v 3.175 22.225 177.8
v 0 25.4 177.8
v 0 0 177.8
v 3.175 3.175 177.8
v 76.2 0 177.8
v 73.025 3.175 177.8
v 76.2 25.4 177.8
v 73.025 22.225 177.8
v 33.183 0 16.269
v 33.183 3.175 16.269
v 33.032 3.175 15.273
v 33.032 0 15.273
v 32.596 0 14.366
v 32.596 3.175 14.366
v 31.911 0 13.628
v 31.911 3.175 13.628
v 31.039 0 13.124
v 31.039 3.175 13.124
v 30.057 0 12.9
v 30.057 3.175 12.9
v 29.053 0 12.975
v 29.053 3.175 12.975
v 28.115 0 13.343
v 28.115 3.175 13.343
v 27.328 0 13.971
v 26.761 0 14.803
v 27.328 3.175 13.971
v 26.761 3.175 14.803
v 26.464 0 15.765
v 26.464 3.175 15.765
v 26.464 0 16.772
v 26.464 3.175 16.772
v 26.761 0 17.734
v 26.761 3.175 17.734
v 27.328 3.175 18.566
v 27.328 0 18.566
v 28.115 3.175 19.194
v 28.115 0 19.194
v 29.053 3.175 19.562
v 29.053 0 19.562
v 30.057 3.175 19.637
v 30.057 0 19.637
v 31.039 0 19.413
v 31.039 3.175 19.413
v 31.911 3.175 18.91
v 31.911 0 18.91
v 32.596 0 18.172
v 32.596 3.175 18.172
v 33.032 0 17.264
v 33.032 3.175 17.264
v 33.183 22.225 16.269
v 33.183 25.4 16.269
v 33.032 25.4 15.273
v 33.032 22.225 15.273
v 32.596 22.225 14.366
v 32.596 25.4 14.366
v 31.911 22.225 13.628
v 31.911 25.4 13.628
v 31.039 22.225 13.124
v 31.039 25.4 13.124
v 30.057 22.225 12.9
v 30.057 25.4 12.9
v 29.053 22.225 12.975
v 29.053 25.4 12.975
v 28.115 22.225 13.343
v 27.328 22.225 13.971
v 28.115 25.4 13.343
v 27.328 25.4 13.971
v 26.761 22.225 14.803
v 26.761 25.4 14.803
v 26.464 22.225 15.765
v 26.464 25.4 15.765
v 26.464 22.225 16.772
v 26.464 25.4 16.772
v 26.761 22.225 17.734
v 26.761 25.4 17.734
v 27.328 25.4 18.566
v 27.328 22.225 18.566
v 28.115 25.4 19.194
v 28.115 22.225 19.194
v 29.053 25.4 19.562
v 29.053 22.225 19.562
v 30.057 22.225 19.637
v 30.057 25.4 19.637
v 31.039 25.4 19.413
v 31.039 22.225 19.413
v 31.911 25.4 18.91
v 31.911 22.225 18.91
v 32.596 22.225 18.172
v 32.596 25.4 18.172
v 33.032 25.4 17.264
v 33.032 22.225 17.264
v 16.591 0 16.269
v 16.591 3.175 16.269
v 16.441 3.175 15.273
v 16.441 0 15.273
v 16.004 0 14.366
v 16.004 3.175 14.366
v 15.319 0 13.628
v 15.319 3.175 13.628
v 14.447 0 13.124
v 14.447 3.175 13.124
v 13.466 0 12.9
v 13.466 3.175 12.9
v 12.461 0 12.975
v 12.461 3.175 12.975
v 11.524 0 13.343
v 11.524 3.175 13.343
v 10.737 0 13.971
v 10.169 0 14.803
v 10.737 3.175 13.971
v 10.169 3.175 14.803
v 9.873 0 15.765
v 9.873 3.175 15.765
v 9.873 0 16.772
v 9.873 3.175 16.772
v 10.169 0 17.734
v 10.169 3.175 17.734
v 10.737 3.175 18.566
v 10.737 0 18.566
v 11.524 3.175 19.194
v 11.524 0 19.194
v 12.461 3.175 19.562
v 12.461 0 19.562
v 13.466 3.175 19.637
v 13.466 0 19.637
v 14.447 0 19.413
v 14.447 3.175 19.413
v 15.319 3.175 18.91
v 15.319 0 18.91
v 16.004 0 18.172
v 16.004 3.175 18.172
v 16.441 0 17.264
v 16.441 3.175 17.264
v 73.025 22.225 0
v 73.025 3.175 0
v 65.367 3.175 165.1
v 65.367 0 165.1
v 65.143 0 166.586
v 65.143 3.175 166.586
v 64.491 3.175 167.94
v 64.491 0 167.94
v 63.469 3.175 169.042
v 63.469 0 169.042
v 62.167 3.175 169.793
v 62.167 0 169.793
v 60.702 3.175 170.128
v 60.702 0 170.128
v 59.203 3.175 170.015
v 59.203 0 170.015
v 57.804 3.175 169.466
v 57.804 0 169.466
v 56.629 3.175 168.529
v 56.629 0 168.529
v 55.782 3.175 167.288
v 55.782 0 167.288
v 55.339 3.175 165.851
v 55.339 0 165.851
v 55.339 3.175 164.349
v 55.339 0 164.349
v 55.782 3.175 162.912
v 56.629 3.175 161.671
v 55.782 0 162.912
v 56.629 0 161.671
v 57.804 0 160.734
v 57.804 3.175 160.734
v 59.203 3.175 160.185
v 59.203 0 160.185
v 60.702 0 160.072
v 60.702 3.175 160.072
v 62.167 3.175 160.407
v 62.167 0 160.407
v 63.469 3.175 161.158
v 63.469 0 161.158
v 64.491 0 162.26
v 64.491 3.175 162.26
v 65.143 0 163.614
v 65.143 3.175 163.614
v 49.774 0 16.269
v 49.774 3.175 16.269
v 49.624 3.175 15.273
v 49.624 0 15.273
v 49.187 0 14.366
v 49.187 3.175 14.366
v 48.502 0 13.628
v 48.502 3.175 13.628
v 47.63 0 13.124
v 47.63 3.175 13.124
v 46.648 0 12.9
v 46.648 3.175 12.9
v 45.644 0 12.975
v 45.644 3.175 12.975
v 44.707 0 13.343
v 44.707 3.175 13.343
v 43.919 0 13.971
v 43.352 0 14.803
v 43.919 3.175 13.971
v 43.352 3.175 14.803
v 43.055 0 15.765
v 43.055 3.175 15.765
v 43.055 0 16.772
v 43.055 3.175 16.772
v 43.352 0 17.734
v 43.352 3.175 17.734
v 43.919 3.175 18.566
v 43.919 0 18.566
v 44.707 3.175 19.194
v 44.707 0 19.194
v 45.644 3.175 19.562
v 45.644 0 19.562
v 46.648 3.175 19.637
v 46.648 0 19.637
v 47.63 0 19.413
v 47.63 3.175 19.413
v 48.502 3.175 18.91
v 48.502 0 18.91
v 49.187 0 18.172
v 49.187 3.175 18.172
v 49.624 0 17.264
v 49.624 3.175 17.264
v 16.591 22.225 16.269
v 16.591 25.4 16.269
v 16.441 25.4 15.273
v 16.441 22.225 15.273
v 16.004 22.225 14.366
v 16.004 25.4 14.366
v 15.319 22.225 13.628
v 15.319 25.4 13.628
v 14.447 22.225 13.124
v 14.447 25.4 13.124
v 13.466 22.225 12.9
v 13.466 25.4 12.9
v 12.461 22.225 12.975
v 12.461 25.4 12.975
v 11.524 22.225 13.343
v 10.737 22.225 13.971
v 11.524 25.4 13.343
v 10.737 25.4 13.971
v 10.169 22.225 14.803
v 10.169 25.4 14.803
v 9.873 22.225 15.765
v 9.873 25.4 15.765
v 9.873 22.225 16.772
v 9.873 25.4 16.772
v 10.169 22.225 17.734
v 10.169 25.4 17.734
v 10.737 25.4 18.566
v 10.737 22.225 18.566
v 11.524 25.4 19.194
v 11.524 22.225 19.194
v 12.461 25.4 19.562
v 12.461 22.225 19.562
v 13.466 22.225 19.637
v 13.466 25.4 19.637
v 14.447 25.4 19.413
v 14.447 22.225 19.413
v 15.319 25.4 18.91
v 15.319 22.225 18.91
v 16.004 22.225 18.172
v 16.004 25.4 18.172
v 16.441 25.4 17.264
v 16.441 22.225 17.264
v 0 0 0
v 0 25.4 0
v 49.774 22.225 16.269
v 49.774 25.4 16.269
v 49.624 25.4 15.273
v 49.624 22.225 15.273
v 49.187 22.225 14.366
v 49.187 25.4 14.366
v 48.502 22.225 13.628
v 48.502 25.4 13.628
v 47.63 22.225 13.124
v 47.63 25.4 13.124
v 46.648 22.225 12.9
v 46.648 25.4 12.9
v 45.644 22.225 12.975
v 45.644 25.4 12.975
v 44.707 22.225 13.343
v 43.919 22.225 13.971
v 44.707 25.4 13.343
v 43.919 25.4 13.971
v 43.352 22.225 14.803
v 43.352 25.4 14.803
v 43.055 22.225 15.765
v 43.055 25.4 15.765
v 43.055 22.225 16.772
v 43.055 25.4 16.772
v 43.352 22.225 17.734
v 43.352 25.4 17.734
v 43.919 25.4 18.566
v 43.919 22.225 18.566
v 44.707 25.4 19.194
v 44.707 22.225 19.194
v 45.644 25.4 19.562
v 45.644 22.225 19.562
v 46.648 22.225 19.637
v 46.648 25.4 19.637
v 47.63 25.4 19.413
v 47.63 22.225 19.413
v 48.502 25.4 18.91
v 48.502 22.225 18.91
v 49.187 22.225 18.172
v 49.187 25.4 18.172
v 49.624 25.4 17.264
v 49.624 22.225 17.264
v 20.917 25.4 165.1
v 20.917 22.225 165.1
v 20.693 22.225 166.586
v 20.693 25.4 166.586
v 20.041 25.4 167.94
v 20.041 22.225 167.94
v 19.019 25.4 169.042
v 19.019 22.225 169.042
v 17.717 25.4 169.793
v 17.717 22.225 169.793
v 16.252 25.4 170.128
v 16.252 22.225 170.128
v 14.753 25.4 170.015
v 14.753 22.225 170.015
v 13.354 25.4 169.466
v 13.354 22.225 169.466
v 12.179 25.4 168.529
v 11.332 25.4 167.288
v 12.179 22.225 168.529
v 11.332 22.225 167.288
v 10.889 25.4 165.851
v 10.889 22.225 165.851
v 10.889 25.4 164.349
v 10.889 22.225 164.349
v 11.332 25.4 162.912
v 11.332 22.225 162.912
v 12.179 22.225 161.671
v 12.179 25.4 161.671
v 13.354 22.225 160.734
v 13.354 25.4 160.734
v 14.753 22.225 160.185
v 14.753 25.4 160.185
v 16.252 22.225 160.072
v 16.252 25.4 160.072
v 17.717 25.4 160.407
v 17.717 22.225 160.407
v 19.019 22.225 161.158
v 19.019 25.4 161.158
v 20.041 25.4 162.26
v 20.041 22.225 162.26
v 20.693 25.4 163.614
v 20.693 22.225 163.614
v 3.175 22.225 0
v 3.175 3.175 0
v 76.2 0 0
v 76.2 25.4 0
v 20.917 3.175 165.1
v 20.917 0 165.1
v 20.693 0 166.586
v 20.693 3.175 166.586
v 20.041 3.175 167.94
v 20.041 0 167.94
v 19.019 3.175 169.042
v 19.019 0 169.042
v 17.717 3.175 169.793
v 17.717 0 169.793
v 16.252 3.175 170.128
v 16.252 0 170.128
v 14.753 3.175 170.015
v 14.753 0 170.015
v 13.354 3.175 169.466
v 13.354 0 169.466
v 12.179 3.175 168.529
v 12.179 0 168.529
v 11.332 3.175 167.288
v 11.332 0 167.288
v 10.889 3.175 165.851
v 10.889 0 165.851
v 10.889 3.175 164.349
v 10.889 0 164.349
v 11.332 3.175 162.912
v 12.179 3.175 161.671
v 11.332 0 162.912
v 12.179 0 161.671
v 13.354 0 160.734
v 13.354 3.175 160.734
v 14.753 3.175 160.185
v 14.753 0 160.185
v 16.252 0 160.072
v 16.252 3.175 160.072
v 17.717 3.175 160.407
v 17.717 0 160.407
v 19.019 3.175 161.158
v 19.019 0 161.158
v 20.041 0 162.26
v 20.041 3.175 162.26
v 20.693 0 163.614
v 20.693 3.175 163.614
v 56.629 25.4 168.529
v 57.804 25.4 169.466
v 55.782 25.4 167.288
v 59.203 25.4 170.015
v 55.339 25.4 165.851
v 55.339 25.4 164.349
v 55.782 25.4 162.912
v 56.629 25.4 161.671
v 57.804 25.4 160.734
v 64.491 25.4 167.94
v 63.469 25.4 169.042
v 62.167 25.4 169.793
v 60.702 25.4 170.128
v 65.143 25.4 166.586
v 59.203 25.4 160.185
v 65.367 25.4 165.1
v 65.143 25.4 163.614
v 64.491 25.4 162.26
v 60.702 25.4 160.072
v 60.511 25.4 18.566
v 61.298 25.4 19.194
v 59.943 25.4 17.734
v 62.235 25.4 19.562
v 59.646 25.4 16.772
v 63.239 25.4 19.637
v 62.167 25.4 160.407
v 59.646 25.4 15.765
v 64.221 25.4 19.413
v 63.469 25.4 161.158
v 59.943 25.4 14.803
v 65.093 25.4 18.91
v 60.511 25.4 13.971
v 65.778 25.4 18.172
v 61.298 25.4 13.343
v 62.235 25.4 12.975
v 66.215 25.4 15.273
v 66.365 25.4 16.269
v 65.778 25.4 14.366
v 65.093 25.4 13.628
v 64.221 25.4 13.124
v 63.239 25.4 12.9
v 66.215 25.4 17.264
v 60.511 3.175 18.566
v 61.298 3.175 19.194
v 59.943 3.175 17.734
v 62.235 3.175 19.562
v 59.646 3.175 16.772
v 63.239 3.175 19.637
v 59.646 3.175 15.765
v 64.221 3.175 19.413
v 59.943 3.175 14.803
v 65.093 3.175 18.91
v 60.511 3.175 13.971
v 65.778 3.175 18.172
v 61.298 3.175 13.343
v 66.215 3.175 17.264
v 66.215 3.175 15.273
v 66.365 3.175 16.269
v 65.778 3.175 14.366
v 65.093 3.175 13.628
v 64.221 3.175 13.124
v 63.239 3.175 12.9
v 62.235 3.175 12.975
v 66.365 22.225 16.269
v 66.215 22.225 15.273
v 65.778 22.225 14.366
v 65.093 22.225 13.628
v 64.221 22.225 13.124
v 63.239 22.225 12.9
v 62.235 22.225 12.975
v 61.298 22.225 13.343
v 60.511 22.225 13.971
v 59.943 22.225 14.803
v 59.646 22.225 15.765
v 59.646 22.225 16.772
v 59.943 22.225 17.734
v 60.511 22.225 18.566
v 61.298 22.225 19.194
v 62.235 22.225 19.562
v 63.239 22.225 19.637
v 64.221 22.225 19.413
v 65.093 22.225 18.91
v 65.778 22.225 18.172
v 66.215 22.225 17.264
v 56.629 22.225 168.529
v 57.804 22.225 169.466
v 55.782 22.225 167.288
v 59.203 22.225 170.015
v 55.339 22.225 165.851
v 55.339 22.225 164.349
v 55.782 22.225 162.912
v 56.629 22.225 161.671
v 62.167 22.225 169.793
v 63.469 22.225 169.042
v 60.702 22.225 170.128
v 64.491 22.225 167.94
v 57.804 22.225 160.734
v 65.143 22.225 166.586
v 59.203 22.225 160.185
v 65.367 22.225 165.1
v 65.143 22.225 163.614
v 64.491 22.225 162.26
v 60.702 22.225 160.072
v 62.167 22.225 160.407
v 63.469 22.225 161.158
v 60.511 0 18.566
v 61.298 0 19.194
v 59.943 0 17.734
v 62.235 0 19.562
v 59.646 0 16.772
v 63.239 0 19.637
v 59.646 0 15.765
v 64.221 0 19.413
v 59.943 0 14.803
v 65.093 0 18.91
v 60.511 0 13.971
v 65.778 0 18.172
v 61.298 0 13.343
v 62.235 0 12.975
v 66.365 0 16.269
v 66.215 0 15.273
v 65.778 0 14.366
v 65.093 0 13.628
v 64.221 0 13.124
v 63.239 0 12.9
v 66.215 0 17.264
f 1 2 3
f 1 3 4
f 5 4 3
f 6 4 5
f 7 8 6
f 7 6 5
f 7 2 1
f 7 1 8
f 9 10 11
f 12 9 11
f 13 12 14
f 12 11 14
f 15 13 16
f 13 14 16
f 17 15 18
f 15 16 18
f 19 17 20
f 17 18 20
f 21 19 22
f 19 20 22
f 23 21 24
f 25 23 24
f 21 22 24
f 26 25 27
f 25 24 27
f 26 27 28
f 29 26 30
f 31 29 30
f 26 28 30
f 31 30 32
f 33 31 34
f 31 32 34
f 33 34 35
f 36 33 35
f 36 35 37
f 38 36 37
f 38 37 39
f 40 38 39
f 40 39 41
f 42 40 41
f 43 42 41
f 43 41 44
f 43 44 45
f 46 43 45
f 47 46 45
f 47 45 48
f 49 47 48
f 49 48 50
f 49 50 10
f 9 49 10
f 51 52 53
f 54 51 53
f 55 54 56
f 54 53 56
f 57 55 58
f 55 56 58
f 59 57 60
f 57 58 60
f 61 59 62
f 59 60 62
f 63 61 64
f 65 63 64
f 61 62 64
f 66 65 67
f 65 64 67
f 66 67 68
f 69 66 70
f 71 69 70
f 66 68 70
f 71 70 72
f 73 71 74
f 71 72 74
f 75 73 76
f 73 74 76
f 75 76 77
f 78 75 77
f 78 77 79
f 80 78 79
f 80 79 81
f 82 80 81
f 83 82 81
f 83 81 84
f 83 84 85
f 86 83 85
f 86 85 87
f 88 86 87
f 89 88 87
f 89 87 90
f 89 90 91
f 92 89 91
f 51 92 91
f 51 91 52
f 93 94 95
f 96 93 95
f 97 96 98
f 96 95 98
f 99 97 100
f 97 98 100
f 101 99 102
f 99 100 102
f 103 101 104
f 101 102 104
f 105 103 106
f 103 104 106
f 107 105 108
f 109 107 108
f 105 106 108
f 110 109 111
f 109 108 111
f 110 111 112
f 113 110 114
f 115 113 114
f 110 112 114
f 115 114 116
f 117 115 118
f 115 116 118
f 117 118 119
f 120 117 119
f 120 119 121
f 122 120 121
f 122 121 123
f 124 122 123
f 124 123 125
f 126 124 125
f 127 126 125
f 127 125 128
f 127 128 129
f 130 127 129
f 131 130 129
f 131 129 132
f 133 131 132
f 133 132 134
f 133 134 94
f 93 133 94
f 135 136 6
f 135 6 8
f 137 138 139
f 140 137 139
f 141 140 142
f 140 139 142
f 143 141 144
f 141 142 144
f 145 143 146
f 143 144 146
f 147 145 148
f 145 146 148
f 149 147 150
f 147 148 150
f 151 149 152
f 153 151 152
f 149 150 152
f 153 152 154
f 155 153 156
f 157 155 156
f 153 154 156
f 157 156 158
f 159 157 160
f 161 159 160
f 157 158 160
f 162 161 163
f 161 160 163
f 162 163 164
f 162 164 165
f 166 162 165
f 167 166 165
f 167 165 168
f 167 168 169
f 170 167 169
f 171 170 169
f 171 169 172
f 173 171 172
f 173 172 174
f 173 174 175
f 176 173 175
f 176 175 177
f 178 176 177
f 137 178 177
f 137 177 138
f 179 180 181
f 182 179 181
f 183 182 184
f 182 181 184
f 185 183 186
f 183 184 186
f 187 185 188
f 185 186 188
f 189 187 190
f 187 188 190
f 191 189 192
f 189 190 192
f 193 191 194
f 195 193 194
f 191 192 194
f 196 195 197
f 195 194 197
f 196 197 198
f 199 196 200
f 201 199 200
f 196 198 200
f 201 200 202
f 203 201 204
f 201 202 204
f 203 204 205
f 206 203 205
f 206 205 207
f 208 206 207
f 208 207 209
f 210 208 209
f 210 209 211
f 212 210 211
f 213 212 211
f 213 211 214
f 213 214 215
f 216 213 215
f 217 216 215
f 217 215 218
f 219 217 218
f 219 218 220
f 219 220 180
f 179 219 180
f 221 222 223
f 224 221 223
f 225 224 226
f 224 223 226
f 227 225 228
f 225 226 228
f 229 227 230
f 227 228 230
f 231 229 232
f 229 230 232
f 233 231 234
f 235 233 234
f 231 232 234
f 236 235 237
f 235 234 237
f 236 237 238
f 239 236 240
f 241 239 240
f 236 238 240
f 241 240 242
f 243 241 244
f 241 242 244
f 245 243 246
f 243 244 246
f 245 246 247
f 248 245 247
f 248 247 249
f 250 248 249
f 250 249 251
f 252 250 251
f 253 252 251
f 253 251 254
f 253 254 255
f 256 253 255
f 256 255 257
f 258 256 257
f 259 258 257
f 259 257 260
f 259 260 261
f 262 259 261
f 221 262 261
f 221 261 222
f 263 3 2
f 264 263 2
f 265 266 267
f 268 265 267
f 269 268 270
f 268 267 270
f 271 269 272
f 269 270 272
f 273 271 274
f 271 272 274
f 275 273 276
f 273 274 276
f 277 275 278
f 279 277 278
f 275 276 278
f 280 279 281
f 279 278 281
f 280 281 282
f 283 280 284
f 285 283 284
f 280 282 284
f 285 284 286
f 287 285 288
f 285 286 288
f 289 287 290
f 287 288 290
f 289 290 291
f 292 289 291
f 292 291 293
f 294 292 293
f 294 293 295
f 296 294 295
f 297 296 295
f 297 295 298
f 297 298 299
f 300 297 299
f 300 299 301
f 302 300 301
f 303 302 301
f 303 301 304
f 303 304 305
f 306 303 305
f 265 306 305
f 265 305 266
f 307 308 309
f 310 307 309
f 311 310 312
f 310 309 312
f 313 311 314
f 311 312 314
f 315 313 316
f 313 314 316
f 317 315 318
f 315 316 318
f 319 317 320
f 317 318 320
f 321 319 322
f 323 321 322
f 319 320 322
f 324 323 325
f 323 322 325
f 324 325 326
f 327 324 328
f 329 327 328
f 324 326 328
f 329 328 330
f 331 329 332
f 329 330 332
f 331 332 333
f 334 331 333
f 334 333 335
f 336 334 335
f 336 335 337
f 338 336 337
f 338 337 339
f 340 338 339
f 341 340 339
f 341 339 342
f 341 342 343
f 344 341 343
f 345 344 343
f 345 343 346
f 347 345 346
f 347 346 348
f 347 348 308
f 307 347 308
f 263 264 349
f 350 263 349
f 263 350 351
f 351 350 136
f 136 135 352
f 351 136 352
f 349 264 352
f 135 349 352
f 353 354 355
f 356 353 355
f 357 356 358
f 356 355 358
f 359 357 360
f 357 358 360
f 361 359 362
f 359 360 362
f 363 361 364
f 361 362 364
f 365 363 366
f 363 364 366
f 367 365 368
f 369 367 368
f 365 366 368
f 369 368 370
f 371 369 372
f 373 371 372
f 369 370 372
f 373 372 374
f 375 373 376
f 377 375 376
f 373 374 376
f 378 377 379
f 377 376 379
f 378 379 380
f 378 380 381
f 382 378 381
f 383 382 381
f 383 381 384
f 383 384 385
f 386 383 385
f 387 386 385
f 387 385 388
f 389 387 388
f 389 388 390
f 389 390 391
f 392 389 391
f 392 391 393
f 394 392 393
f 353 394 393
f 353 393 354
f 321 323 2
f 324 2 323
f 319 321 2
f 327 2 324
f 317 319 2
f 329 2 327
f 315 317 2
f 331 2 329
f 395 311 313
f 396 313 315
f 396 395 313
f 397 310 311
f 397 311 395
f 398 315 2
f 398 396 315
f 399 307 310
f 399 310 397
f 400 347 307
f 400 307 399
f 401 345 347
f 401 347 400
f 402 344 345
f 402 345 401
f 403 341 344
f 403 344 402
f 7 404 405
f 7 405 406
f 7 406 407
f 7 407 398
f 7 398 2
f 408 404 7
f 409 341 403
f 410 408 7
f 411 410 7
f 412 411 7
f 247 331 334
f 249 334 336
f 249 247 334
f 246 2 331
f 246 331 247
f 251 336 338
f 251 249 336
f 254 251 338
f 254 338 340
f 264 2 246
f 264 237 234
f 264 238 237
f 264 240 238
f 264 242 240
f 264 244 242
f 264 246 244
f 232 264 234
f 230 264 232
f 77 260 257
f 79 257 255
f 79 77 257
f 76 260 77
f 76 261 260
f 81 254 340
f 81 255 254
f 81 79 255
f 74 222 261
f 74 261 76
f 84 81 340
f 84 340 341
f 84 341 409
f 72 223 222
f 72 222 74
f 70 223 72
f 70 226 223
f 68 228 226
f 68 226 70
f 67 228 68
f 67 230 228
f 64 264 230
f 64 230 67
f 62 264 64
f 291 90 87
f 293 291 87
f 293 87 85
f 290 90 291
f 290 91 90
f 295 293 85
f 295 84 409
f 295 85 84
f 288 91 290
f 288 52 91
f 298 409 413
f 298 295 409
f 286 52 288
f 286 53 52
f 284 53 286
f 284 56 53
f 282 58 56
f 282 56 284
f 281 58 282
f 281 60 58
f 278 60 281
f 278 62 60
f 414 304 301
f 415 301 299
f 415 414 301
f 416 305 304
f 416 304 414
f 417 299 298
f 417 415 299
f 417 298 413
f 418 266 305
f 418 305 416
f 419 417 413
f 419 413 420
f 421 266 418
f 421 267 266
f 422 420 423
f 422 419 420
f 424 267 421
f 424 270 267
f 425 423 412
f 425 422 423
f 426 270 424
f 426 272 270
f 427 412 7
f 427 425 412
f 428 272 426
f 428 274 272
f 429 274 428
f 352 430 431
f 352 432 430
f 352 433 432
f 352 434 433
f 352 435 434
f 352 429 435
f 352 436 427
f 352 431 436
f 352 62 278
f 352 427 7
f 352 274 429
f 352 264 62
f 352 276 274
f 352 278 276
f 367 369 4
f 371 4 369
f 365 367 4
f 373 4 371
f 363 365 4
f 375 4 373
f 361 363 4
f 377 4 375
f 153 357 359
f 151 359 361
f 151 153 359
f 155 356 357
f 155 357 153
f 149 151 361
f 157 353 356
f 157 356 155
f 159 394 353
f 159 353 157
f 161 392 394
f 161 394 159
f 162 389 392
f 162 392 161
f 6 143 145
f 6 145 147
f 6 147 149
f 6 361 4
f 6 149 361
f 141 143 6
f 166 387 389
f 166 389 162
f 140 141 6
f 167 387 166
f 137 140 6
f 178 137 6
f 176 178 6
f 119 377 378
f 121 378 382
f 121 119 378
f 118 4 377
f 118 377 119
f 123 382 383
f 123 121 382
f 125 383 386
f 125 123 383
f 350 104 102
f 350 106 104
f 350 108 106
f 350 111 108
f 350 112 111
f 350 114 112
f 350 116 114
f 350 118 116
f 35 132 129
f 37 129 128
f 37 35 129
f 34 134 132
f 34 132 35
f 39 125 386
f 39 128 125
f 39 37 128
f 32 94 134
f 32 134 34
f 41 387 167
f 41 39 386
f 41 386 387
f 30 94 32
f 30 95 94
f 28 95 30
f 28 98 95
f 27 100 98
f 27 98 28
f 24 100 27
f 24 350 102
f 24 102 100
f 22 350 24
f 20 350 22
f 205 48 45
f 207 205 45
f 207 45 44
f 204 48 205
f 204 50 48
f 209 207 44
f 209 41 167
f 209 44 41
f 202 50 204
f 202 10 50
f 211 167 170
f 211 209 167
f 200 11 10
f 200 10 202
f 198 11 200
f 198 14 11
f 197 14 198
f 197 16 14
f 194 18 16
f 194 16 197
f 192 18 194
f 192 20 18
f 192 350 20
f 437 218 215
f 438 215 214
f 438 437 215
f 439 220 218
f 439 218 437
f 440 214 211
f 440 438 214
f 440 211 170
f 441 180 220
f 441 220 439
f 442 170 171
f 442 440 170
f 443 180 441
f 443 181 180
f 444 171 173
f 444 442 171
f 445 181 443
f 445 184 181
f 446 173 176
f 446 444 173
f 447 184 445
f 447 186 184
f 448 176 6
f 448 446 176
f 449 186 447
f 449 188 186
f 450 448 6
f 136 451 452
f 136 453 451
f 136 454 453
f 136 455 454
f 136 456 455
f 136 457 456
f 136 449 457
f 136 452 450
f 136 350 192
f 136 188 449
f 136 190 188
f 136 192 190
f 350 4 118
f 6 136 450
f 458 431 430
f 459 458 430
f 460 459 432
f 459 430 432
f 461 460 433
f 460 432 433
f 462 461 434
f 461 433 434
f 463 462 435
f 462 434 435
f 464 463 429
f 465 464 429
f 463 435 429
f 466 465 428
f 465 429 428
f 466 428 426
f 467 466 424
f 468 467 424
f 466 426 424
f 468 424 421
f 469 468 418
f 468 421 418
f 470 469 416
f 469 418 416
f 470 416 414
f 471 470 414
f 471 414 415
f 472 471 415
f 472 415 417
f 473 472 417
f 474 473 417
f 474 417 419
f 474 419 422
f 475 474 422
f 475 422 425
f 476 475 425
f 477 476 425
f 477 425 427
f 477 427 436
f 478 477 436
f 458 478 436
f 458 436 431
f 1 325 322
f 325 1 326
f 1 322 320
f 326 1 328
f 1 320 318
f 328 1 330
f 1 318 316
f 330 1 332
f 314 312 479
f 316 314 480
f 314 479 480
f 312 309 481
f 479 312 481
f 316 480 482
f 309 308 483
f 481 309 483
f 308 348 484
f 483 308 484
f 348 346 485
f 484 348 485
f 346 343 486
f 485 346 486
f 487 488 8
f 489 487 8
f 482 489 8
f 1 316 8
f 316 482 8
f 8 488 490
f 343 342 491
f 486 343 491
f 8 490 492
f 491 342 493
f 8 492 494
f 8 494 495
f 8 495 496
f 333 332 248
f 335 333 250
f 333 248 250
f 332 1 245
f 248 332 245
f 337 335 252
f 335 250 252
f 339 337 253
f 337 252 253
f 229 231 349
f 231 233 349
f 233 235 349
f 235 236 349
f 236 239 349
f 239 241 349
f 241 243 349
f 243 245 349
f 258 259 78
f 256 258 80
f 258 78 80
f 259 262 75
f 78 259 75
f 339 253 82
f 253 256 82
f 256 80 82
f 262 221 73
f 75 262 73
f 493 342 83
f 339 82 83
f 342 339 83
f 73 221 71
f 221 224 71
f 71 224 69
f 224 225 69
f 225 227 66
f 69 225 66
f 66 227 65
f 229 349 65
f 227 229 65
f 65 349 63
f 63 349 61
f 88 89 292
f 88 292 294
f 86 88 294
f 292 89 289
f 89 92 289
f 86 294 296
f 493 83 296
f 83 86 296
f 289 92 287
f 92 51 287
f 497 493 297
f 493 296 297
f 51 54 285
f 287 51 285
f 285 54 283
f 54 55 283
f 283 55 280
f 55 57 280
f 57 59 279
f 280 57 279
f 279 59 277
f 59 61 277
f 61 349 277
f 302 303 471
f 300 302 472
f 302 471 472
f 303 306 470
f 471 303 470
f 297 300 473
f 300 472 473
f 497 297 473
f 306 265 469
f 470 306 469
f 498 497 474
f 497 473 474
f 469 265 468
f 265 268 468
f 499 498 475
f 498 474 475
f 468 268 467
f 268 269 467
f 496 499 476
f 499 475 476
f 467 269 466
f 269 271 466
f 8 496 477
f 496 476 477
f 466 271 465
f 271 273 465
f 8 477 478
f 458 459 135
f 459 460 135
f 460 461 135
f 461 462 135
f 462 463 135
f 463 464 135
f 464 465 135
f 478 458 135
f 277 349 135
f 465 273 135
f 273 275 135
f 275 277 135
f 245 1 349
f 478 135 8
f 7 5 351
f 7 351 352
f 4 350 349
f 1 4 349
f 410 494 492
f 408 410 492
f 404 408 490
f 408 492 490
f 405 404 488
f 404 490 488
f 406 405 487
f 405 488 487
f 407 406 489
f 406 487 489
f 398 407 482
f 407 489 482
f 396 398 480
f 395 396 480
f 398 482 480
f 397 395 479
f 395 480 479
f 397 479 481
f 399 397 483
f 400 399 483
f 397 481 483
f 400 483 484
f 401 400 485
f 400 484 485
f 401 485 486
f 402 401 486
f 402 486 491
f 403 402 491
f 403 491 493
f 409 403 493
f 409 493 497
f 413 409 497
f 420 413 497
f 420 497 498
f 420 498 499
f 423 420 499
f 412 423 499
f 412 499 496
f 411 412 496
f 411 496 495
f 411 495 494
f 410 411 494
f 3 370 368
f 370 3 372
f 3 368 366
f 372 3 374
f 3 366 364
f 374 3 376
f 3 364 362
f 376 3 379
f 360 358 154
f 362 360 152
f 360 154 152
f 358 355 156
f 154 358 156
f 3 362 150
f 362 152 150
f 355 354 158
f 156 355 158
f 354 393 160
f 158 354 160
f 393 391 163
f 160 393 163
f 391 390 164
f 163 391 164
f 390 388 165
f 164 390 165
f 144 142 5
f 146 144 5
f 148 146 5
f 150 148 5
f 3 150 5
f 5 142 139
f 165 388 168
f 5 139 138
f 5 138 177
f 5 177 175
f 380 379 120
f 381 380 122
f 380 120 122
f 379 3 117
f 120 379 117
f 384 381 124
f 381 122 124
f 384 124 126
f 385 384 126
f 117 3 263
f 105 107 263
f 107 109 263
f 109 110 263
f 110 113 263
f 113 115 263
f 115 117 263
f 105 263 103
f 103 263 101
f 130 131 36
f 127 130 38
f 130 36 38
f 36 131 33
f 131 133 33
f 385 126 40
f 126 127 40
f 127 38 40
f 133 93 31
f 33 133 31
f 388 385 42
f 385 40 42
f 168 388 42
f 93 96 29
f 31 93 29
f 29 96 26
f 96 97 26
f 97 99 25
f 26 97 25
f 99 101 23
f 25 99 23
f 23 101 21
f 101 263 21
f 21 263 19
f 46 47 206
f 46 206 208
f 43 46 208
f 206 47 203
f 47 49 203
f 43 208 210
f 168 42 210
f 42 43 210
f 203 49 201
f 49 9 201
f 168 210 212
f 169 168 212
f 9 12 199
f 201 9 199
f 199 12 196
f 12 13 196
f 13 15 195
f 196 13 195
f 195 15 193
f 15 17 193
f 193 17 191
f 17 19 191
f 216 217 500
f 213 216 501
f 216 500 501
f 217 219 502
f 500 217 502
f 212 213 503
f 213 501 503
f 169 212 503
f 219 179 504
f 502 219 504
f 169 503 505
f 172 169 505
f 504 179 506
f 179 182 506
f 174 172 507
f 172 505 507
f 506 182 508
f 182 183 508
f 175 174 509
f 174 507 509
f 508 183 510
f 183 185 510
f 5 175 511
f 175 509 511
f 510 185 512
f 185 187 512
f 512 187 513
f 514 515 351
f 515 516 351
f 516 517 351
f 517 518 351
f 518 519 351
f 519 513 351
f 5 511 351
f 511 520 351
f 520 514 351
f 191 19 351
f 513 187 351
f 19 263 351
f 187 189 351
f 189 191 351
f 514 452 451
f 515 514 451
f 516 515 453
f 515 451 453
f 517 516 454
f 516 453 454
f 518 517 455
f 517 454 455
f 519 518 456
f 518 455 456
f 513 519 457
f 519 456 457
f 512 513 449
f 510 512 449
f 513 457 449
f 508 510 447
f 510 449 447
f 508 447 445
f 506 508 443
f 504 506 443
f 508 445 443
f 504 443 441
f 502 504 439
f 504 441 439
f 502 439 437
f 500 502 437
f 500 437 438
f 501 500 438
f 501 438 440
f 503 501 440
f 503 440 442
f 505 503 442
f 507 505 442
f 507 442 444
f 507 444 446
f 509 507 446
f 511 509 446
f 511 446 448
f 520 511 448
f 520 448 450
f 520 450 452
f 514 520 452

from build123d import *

# Parameters (mm, degrees)
SKETCH1_W           = 76.2
SKETCH1_H           = 25.4
SKETCH1_W_2         = 69.85
SKETCH1_H_2         = 19.05
BOSS_EXTRUDE1_DEPTH = 177.8
SKETCH4_R           = 3.3782
CUT_EXTRUDE1_DEPTH  = 26.4
SKETCH5_R           = 5.0419
CUT_EXTRUDE2_DEPTH  = 26.4


with BuildPart() as part:
    # Sketch1 → Boss-Extrude1 (new body)
    with BuildSketch(Plane.XY):
        with Locations((38.1, 12.7)):
            Rectangle(SKETCH1_W, SKETCH1_H)
        with Locations((38.1, 12.7)):
            Rectangle(SKETCH1_W_2, SKETCH1_H_2, mode=Mode.SUBTRACT)
    extrude(amount=BOSS_EXTRUDE1_DEPTH)

    # Sketch4 → Cut-Extrude1 (cut, through all)
    with BuildSketch(Plane(origin=(0, 25.4, 0), x_dir=(1, 0, 0), z_dir=(0, 1, 0))):
        with Locations((13.21308, -16.2687)):
            Circle(SKETCH4_R)
        with Locations((29.80436, -16.2687)):
            Circle(SKETCH4_R)
        with Locations((46.39564, -16.2687)):
            Circle(SKETCH4_R)
        with Locations((62.98692, -16.2687)):
            Circle(SKETCH4_R)
    extrude(amount=-CUT_EXTRUDE1_DEPTH, mode=Mode.SUBTRACT)

    # Sketch5 → Cut-Extrude2 (cut, through all)
    with BuildSketch(Plane.XZ):
        with Locations((60.325, 165.1)):
            Circle(SKETCH5_R)
        with Locations((15.875, 165.1)):
            Circle(SKETCH5_R)
    extrude(amount=-CUT_EXTRUDE2_DEPTH, mode=Mode.SUBTRACT)


solid = part.part
